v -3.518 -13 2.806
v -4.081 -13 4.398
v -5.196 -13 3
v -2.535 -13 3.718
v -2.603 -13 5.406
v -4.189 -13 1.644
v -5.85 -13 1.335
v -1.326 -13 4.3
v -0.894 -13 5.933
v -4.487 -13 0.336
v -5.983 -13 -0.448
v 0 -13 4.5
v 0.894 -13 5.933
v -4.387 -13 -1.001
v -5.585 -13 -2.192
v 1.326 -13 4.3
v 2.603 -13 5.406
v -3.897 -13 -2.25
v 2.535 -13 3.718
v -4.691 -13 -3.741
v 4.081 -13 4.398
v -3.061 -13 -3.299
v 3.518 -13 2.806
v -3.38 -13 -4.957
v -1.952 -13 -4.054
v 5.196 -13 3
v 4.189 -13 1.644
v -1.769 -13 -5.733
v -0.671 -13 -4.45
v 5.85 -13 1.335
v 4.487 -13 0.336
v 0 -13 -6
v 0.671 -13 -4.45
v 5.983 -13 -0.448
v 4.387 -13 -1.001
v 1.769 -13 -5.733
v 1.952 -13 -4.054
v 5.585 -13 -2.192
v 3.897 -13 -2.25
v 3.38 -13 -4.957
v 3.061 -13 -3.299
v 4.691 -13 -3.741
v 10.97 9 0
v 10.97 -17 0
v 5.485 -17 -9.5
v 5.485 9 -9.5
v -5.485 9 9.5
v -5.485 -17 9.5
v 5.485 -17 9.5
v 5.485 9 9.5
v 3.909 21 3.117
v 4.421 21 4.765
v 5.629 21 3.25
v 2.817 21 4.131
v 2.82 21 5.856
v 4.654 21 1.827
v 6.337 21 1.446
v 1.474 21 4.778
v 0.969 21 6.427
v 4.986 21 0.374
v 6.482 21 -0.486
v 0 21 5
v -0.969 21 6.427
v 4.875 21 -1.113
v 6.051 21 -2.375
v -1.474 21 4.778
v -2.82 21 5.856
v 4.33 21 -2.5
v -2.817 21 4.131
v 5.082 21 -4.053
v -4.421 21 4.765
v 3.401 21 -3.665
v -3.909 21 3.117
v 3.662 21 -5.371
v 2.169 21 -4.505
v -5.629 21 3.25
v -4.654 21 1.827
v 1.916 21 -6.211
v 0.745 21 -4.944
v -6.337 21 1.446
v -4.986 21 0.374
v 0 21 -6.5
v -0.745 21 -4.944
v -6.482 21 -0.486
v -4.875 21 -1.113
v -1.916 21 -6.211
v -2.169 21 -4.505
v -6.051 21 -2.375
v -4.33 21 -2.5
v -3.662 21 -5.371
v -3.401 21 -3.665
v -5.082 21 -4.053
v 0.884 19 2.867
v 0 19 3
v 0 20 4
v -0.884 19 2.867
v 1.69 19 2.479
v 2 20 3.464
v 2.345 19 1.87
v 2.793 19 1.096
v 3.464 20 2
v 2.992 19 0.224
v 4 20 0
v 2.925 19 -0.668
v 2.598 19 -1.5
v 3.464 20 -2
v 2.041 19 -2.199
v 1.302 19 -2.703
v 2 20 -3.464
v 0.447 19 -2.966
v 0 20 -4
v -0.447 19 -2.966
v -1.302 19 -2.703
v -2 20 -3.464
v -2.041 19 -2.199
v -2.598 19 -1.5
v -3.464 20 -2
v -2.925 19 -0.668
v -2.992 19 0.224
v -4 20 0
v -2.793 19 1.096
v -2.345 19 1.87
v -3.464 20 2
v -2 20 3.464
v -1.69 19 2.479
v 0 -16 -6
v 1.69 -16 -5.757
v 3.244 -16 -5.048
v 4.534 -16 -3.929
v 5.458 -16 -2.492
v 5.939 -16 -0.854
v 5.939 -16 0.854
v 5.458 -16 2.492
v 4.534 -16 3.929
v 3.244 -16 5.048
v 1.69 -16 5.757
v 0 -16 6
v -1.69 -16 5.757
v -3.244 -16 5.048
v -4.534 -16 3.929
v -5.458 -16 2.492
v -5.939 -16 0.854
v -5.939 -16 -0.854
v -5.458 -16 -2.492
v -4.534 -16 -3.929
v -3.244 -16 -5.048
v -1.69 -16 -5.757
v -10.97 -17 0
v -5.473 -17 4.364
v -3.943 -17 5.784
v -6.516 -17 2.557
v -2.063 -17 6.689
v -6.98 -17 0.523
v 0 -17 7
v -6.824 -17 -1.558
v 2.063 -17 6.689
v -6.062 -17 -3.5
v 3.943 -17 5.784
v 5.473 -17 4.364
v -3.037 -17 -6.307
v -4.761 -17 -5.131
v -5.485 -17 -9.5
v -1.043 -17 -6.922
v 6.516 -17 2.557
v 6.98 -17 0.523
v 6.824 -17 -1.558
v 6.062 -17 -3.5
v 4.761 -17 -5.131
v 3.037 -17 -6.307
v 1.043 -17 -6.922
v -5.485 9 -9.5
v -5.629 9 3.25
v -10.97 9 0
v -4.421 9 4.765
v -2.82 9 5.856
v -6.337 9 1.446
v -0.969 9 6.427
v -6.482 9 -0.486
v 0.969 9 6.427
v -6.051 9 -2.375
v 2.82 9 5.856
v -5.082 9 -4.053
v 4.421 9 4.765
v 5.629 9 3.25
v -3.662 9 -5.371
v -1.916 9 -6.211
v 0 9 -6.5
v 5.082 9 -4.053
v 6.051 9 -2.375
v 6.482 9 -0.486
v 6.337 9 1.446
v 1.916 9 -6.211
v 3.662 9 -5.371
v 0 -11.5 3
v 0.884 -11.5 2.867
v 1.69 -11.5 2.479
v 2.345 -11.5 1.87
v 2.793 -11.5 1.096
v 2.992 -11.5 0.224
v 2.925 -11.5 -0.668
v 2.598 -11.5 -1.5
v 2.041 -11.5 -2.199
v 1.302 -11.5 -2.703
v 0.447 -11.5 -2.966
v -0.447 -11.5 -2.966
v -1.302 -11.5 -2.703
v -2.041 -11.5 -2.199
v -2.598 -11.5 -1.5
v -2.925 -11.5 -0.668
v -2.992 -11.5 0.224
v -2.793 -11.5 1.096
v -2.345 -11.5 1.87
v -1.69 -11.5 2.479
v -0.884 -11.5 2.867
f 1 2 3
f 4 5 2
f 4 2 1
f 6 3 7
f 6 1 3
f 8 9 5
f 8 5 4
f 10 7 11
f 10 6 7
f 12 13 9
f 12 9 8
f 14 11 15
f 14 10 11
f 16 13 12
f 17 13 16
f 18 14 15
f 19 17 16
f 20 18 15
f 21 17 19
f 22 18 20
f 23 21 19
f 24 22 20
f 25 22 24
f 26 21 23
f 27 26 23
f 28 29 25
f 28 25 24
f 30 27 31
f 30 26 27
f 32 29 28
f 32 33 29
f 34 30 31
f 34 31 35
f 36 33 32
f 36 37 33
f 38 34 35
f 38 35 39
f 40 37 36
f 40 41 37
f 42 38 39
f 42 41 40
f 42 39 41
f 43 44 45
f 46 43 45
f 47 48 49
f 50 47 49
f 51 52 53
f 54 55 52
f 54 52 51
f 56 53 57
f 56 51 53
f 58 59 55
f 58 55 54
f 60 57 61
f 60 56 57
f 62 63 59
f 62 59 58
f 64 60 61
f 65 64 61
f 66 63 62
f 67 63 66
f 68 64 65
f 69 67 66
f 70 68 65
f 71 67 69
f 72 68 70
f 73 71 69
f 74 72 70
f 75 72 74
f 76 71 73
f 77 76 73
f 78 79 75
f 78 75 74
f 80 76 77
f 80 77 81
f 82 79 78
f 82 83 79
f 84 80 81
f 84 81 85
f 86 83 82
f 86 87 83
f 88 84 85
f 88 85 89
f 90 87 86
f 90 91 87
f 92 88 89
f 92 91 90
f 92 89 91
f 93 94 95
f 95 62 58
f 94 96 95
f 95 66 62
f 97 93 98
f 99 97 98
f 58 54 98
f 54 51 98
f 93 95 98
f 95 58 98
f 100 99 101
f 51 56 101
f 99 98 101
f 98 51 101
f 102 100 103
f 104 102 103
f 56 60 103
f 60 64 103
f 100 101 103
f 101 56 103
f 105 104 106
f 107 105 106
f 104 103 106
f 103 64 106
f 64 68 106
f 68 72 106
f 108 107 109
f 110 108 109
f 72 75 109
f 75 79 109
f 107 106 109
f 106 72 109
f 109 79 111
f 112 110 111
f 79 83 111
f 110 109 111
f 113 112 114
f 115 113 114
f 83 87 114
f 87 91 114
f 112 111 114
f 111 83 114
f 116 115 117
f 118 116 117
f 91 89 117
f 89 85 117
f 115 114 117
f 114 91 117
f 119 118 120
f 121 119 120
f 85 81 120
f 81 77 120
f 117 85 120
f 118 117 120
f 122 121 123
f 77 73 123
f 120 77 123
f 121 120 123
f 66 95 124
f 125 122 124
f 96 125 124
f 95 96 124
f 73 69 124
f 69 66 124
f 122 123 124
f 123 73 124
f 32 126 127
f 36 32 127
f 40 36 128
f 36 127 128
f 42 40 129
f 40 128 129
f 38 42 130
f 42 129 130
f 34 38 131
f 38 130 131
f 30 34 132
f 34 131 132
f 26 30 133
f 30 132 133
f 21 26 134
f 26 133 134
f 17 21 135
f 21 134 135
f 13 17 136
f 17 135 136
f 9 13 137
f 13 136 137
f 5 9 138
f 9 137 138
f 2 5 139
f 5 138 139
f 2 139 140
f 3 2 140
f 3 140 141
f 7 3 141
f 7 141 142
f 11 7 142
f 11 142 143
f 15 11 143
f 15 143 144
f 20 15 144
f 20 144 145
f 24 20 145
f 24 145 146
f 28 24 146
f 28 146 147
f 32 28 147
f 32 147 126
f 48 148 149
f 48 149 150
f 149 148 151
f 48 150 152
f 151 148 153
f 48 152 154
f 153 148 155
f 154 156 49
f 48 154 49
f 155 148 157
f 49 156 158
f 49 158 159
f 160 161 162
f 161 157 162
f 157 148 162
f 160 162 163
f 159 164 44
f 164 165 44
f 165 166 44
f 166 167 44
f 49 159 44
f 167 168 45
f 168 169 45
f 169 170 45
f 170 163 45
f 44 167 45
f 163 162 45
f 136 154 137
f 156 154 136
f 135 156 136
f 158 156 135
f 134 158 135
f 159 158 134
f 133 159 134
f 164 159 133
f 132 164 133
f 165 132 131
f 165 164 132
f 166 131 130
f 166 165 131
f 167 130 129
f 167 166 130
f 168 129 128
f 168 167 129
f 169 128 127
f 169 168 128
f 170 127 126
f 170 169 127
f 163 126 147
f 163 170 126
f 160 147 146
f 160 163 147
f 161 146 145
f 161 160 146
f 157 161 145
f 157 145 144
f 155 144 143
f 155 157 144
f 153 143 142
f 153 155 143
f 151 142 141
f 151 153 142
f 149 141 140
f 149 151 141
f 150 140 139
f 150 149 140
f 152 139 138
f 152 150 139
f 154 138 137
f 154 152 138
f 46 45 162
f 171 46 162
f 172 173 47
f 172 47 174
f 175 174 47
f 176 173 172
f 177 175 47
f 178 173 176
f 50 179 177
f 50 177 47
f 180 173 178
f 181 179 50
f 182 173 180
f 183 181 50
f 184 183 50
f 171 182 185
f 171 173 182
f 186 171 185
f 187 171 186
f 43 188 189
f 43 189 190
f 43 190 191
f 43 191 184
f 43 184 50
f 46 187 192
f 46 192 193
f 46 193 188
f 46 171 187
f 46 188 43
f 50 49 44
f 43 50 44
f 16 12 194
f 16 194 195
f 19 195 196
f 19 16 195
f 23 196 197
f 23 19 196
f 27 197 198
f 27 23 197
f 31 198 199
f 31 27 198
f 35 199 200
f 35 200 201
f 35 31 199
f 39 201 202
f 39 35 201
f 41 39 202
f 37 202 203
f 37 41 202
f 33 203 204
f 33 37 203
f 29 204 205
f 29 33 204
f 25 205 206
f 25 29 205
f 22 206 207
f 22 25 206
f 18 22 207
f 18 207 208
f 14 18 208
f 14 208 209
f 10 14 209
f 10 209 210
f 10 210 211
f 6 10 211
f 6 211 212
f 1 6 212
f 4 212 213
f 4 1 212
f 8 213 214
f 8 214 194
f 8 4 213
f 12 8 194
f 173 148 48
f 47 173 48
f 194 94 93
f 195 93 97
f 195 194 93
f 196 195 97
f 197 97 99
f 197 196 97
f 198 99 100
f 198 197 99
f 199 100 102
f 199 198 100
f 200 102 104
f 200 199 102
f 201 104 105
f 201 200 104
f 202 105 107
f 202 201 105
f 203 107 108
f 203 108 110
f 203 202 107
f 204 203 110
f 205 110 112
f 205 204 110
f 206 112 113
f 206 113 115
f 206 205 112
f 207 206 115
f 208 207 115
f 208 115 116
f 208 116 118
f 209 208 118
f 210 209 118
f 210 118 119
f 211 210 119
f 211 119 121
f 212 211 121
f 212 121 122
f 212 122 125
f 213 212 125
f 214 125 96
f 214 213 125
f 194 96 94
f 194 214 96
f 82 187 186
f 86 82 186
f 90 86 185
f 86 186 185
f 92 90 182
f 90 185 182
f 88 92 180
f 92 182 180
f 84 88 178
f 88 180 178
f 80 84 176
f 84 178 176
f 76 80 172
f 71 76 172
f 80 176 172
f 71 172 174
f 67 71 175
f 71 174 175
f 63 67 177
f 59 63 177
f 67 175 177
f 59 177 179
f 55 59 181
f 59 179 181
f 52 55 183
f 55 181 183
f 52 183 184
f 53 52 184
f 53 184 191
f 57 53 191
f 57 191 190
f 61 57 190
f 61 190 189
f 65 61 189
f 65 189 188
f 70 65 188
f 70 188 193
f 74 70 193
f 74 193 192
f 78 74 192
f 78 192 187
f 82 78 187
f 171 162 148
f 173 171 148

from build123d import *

# Parameters (mm, degrees)
DODANIE_WYCI_GNI_CIE1_DEPTH      = 9
DODANIE_WYCI_GNI_CIE1_DEPTH_BACK = 17
SZKIC1_R                         = 3
SZKIC1_3_R                       = 6.5
SZKIC1_3_R_2                     = 3
DODANIE_WYCI_GNI_CIE2_DEPTH      = 21
SFAZOWANIE1_SIZE                 = 2
SFAZOWANIE2_SIZE                 = 4
SZKIC3_R                         = 6
WYTNIJ_WYCI_GNI_CIE1_DEPTH       = 4
SFAZOWANIE3_SIZE                 = 1.5


with BuildPart() as part:
    # Szkic1 → Dodanie-wyciągnięcie1 (new, two sides: drawn at the far end of the back side and taken through both)
    with BuildSketch(Plane(origin=(0, 0, 0), x_dir=(1, 0, 0), z_dir=(0, 1, 0)).offset(-DODANIE_WYCI_GNI_CIE1_DEPTH_BACK)):
        Polygon((-5.484827557, 9.5), (-10.969655115, 0), (-5.484827557, -9.5), (5.484827557, -9.5), (10.969655115, 0), (5.484827557, 9.5), align=None)
        Circle(SZKIC1_R, mode=Mode.SUBTRACT)
    extrude(amount=DODANIE_WYCI_GNI_CIE1_DEPTH + DODANIE_WYCI_GNI_CIE1_DEPTH_BACK)

    # Szkic1<3> → Dodanie-wyciągnięcie2 (add)
    with BuildSketch(Plane(origin=(0, 0, 0), x_dir=(1, 0, 0), z_dir=(0, 1, 0))):
        Circle(SZKIC1_3_R)
        Circle(SZKIC1_3_R_2, mode=Mode.SUBTRACT)
    extrude(amount=DODANIE_WYCI_GNI_CIE2_DEPTH)

    # Sfazowanie1
    sfazowanie1_edges = [part.edges().sort_by_distance(p)[0] for p in [
        (-3, 21, 0),
    ]]
    chamfer(sfazowanie1_edges, length=SFAZOWANIE1_SIZE)

    # Sfazowanie2
    sfazowanie2_edges = [part.edges().sort_by_distance(p)[0] for p in [
        (-3, -17, 0),
    ]]
    chamfer(sfazowanie2_edges, length=SFAZOWANIE2_SIZE)

    # Szkic3 → Wytnij-wyciągnięcie1 (cut)
    with BuildSketch(Plane.XZ.offset(17)):
        Circle(SZKIC3_R)
    extrude(amount=-WYTNIJ_WYCI_GNI_CIE1_DEPTH, mode=Mode.SUBTRACT)

    # Sfazowanie3
    sfazowanie3_edges = [part.edges().sort_by_distance(p)[0] for p in [
        (-3, -13, 0),
    ]]
    chamfer(sfazowanie3_edges, length=SFAZOWANIE3_SIZE)


solid = part.part
